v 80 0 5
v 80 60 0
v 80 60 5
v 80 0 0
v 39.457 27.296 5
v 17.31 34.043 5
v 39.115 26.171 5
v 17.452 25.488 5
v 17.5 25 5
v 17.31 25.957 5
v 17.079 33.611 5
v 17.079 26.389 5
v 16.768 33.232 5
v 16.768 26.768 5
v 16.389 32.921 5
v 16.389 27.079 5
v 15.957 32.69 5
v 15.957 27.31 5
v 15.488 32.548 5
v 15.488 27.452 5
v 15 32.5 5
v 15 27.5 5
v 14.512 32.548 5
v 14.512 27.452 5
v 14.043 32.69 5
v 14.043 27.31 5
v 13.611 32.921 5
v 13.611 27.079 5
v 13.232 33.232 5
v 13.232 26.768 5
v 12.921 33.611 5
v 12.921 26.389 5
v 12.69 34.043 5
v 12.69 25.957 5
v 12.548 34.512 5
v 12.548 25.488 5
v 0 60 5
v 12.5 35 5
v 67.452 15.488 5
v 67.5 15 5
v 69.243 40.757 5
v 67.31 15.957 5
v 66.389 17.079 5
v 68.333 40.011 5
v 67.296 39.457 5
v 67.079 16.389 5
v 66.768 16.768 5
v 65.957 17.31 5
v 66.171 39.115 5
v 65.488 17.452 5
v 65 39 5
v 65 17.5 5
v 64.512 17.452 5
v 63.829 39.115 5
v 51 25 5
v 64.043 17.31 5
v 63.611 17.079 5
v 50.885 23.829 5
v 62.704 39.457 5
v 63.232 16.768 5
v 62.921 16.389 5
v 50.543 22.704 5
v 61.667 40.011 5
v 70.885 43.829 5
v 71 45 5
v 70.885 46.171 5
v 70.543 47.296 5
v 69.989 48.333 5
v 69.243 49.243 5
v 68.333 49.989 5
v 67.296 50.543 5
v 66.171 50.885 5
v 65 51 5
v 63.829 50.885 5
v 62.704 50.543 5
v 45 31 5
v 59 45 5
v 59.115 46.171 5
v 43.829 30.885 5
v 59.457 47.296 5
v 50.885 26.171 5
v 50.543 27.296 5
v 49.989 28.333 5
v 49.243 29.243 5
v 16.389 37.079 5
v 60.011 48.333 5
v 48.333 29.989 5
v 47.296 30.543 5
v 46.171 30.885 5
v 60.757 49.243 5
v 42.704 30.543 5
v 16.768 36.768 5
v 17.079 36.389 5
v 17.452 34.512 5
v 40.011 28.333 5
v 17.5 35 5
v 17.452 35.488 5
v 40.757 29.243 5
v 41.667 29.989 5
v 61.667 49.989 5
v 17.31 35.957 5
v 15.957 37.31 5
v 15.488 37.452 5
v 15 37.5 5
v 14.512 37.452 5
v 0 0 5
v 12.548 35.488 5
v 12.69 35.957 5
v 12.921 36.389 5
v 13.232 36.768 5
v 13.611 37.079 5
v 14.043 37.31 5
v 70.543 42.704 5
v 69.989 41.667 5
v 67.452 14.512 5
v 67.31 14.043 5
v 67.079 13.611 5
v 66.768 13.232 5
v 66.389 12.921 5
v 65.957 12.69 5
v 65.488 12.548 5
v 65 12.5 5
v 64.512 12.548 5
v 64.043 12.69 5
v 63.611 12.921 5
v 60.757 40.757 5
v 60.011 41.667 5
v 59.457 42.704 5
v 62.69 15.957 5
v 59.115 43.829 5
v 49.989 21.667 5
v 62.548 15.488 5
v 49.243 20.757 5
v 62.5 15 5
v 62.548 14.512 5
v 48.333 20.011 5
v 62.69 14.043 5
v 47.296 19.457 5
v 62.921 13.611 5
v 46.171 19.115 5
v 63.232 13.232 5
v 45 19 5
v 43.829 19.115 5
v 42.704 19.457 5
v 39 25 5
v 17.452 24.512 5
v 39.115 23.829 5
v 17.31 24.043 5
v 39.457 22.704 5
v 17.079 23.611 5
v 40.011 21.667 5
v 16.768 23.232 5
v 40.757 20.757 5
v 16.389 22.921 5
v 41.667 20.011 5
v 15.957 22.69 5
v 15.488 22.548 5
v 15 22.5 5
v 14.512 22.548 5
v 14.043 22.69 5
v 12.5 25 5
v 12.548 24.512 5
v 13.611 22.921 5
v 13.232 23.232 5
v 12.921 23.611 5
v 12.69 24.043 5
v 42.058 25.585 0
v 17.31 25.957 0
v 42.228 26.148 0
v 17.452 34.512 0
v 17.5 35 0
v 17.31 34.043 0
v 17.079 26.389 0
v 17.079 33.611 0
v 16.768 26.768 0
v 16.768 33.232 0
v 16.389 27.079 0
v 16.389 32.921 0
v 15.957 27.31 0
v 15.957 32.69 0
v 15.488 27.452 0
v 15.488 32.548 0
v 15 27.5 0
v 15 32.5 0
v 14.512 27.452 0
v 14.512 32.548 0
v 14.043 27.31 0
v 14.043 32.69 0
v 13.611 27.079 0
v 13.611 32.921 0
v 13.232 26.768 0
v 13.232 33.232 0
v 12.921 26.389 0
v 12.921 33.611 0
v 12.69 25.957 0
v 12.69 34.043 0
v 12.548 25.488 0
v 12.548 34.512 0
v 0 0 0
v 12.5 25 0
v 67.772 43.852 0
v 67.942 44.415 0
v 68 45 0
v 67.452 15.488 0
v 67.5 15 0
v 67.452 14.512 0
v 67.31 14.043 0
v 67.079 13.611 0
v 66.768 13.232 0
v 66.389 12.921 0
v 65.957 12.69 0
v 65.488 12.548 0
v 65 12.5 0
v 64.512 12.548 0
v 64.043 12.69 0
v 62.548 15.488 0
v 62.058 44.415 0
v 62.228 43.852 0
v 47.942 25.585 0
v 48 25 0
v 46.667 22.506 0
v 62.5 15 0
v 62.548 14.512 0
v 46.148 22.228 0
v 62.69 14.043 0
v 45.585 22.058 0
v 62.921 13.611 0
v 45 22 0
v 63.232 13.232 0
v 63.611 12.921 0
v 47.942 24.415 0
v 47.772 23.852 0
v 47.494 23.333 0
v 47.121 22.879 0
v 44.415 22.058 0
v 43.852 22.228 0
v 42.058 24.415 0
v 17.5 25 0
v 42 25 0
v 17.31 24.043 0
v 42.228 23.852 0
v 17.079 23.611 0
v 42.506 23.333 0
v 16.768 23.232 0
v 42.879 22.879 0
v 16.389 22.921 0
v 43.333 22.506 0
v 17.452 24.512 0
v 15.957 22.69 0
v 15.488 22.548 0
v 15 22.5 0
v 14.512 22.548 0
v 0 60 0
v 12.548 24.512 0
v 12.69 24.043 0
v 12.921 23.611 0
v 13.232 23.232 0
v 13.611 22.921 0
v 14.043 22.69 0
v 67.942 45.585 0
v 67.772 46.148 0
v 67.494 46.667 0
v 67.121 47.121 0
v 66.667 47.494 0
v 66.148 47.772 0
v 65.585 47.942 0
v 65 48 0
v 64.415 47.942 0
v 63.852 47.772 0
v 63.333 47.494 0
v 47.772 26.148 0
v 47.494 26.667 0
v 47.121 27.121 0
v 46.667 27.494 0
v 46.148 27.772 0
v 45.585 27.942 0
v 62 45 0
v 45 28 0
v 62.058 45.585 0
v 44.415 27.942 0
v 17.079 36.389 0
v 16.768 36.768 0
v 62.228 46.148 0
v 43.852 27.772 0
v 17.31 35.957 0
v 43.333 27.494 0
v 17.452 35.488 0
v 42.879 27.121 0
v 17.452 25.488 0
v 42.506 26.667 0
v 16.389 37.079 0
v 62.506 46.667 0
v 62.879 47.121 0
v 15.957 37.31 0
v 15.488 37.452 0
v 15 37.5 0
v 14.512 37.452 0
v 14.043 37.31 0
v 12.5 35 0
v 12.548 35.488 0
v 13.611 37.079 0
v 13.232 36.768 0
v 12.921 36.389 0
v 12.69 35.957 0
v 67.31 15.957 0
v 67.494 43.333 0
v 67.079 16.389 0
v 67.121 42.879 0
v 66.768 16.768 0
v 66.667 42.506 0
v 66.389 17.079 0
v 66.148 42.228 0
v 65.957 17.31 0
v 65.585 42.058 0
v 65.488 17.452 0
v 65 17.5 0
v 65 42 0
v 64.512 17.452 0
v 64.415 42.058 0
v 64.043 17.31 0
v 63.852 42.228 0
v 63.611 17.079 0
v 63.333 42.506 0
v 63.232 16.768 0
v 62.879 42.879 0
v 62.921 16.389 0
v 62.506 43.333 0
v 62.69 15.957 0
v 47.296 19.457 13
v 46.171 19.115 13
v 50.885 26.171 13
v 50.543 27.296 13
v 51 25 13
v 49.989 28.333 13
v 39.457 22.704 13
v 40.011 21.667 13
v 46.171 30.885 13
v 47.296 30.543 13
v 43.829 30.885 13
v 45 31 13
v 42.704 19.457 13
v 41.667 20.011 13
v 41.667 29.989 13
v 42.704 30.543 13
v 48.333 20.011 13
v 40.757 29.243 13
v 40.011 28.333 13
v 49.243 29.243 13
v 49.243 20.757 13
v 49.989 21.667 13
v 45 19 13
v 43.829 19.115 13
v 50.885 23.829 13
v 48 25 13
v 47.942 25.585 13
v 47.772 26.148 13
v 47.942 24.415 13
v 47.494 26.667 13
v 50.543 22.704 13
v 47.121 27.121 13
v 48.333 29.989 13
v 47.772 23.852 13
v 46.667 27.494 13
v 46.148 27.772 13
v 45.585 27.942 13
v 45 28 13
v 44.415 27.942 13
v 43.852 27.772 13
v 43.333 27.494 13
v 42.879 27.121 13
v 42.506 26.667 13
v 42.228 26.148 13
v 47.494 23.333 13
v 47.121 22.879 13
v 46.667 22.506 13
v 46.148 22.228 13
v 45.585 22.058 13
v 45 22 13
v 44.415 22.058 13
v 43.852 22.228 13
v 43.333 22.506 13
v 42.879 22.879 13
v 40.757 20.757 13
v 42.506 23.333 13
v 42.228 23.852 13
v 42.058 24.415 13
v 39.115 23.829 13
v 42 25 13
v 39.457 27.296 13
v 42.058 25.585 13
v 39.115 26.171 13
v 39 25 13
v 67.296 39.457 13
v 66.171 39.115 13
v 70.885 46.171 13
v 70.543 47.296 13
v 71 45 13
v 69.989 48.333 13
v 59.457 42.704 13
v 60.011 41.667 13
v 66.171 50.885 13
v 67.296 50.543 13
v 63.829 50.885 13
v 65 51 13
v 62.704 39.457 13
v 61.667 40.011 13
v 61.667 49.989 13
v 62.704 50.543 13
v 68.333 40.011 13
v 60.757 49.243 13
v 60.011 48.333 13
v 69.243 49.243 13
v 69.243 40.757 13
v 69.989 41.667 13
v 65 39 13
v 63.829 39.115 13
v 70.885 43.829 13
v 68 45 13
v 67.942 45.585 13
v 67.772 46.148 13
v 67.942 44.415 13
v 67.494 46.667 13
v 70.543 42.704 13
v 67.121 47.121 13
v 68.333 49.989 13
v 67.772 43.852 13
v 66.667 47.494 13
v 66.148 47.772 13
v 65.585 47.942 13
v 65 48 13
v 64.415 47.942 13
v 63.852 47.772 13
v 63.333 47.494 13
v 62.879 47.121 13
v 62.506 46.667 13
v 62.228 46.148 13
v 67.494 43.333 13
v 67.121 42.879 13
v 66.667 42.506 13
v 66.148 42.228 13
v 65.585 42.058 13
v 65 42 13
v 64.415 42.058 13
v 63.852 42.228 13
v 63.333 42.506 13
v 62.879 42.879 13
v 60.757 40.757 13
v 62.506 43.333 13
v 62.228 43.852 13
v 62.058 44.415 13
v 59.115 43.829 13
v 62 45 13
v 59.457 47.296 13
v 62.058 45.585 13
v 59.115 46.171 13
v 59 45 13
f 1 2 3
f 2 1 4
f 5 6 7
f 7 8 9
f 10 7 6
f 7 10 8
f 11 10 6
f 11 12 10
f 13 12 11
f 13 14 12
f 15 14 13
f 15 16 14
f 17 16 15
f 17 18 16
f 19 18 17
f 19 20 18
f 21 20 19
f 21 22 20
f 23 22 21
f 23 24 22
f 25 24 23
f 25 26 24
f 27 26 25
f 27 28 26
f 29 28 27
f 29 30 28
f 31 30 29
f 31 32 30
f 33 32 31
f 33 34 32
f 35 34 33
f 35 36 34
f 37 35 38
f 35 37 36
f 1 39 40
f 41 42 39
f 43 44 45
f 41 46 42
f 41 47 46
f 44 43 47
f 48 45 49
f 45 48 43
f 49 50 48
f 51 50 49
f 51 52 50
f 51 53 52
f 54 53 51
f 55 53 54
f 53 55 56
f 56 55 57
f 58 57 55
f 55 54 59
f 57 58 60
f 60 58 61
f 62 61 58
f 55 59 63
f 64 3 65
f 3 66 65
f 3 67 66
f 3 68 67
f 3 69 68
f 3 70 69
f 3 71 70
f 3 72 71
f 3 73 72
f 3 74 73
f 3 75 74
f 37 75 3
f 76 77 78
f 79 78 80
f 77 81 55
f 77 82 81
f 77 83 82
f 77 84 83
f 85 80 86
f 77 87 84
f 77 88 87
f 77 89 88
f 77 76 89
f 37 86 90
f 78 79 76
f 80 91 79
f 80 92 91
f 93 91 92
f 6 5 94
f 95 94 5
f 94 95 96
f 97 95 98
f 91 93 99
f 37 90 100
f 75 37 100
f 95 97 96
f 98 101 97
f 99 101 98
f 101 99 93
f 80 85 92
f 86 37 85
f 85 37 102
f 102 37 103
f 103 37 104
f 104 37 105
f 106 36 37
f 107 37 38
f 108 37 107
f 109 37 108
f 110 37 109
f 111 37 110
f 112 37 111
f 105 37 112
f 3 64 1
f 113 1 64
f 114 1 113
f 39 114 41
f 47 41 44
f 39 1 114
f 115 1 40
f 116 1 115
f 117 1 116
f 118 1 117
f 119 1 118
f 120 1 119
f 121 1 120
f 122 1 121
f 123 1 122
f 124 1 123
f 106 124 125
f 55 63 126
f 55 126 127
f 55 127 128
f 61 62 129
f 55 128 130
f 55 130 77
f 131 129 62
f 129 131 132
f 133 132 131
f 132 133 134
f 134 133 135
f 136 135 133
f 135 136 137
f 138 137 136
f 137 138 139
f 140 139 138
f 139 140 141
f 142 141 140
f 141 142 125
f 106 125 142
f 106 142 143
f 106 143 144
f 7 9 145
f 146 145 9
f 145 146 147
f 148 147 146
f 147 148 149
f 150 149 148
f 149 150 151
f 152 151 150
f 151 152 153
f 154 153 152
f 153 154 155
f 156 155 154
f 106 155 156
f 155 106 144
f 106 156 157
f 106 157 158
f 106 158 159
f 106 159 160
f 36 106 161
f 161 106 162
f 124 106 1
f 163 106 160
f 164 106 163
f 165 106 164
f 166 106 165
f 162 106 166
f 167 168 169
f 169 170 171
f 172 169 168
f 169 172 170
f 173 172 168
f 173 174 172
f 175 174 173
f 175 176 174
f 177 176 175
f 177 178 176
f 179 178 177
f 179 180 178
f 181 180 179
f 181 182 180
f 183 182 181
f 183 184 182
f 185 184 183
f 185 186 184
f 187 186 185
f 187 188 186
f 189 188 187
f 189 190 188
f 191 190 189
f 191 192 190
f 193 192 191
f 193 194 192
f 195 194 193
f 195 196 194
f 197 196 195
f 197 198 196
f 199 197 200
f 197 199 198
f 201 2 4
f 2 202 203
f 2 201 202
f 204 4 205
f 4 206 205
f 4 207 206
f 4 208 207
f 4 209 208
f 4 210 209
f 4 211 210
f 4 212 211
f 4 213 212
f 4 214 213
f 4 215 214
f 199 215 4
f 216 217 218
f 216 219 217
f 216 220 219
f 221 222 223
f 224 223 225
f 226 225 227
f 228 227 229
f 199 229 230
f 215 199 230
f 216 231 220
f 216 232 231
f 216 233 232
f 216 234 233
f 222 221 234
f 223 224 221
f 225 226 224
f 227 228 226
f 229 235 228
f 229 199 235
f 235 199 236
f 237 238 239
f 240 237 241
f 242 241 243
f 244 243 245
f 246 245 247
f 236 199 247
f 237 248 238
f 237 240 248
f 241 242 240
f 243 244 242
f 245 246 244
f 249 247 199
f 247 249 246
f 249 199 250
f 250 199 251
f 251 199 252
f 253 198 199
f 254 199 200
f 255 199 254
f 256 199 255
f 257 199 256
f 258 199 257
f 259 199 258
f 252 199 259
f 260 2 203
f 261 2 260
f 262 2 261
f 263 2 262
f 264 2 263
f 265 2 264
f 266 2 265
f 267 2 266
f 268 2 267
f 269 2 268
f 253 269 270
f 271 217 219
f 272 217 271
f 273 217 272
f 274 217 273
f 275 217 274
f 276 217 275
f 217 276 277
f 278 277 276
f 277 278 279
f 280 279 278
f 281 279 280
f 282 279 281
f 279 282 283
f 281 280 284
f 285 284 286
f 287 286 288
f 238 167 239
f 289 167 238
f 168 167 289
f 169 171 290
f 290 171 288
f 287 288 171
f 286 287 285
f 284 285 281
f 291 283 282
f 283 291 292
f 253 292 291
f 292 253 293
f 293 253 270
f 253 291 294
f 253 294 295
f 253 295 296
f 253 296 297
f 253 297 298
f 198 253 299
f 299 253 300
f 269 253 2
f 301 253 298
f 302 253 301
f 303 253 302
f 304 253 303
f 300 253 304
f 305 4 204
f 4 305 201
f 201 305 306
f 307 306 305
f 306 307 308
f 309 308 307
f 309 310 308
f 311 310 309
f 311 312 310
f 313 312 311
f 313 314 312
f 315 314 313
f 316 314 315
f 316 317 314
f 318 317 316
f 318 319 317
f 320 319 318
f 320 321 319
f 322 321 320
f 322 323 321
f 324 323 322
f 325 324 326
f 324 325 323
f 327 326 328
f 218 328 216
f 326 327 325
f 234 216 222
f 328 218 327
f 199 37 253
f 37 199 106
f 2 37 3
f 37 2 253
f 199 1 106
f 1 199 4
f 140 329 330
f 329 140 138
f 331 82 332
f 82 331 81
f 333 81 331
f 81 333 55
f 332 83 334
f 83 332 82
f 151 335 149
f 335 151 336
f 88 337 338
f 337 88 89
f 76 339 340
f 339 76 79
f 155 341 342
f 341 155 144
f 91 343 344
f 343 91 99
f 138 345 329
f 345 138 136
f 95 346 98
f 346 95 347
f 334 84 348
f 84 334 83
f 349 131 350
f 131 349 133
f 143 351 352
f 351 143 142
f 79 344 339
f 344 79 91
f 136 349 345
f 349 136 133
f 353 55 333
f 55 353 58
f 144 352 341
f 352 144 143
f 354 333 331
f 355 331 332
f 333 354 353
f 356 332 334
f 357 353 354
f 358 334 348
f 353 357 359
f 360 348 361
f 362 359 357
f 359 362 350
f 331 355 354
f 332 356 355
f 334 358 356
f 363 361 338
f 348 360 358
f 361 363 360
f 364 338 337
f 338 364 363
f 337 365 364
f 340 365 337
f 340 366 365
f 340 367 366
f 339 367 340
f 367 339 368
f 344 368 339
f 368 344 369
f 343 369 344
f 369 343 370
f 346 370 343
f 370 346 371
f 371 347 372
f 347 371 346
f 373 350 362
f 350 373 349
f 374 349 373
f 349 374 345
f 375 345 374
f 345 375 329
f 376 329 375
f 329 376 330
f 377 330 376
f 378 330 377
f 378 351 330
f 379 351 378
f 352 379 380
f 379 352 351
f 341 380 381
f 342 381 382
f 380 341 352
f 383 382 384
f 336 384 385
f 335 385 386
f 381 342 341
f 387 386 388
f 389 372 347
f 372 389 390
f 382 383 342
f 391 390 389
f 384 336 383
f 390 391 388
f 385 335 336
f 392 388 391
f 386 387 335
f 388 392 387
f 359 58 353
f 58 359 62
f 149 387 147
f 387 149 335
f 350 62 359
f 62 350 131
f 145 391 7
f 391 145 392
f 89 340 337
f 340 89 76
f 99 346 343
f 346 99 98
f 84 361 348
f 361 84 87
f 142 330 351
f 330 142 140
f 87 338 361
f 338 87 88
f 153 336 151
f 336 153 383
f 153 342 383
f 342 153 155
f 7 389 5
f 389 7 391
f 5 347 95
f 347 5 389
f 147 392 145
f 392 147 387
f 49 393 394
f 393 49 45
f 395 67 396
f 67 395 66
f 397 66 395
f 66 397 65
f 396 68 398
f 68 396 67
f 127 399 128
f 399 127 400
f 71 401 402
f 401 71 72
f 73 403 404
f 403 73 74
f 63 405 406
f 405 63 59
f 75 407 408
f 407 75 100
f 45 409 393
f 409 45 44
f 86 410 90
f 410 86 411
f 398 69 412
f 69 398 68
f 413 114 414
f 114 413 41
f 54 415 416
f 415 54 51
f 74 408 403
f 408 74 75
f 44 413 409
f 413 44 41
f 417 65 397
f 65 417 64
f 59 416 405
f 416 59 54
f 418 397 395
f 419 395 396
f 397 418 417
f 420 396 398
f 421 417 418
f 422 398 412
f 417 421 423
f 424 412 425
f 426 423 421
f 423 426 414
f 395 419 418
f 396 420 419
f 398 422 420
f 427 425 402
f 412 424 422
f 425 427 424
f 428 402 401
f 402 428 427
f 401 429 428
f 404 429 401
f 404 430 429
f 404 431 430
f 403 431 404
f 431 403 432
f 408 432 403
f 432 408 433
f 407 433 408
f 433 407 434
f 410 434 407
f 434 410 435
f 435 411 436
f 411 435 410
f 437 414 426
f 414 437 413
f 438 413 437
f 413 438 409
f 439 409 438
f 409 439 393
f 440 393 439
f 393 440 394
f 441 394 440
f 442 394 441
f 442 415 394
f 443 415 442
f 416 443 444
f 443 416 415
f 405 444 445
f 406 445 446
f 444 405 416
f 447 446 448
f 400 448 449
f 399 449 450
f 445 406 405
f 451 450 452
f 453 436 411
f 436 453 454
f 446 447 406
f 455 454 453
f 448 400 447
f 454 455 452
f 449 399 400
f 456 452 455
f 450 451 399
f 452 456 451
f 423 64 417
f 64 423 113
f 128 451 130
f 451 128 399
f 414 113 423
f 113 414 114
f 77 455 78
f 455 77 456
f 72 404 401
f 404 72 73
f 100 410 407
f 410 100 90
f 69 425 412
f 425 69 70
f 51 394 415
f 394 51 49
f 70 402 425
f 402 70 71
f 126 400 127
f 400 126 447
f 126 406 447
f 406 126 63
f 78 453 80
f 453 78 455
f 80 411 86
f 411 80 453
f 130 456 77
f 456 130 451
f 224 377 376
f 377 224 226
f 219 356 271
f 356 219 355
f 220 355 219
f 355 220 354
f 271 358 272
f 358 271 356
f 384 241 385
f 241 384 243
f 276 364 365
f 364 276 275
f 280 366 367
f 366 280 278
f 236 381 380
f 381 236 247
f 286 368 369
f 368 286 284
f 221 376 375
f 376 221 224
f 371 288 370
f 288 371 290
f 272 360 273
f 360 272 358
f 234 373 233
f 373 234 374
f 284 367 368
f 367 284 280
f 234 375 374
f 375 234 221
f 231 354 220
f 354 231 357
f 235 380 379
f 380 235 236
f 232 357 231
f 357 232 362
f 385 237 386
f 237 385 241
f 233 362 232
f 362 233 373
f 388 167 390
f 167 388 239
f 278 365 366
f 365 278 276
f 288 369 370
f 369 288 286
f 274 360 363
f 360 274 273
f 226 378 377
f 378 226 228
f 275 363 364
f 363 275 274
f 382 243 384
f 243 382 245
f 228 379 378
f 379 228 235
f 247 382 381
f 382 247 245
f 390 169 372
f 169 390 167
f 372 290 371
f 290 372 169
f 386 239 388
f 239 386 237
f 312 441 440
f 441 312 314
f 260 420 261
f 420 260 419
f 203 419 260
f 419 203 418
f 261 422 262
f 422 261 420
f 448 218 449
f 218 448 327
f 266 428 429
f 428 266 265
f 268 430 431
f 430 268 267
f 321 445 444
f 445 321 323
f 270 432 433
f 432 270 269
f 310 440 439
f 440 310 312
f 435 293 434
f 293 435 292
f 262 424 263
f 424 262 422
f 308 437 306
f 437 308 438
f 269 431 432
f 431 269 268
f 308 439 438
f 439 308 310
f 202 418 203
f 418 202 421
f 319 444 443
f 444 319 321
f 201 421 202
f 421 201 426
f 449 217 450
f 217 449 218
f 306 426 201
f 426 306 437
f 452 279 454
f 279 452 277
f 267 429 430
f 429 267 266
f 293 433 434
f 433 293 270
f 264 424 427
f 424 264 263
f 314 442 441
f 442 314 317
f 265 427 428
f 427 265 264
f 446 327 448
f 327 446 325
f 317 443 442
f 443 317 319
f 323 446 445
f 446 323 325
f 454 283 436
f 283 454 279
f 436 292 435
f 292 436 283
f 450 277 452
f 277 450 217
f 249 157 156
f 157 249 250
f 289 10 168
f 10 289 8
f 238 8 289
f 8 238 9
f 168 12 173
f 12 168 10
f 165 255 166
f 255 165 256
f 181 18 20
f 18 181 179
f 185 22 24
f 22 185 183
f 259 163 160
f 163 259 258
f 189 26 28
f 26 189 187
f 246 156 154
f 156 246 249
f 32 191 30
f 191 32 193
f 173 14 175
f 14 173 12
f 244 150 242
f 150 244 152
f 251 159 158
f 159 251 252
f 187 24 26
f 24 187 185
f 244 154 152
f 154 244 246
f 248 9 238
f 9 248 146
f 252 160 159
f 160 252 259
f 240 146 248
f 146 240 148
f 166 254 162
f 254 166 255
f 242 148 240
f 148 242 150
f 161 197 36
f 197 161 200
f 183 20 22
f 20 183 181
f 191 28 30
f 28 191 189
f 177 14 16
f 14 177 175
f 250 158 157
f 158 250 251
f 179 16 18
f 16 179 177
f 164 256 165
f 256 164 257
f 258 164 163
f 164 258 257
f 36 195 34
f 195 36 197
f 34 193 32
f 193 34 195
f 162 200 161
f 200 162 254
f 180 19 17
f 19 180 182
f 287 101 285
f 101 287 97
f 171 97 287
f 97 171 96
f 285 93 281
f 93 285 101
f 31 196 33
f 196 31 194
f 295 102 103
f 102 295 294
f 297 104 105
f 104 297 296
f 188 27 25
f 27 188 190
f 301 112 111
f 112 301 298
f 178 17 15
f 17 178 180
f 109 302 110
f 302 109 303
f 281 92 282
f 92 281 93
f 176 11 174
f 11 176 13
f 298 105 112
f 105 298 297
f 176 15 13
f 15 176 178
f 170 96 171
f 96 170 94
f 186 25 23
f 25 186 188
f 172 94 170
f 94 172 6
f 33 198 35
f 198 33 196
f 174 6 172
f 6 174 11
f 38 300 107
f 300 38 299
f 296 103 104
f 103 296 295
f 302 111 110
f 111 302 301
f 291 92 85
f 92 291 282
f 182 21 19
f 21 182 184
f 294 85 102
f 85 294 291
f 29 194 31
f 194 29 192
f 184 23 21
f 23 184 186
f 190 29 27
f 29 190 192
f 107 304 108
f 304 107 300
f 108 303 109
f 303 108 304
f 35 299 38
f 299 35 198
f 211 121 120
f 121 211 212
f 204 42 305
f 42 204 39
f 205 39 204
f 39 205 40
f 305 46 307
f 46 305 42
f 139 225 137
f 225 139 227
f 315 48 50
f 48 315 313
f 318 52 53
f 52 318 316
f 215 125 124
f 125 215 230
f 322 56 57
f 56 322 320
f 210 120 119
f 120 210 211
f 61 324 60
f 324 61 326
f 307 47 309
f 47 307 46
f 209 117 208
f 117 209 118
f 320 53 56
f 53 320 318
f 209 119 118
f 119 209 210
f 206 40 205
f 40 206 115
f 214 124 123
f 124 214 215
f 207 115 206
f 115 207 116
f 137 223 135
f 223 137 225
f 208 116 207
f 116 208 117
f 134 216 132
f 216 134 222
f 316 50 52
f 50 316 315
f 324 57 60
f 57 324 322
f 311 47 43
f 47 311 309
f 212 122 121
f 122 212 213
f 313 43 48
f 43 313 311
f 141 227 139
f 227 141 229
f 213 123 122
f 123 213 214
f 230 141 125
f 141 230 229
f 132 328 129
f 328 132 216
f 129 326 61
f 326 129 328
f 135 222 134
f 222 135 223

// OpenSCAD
$fn = 32;

// ----------------------------------------------------------------------
// Mixed field: bosses and holes at given coordinates
// ----------------------------------------------------------------------

// --- parameters (mm) ---
plate_l = 80;             // plate length, X
plate_w = 60;             // plate width, Y
plate_t = 5;              // plate thickness, Z
boss_d = 12;              // boss diameter
boss_h = 8;               // boss height above the plate
hole_d = 5;               // through hole diameter

total_h = plate_t + boss_h;  // overall height

difference() {
  union() {
    cube([plate_l, plate_w, plate_t]);
    translate([45, 25, plate_t]) cylinder(h = boss_h, d = boss_d);
    translate([65, 45, plate_t]) cylinder(h = boss_h, d = boss_d);
  }
  translate([45, 25, -1]) cylinder(h = total_h + 2, d = boss_d / 2);
  translate([65, 45, -1]) cylinder(h = total_h + 2, d = boss_d / 2);
  translate([15, 25, -1]) cylinder(h = plate_t + 2, d = hole_d);
  translate([15, 35, -1]) cylinder(h = plate_t + 2, d = hole_d);
  translate([65, 15, -1]) cylinder(h = plate_t + 2, d = hole_d);
}
